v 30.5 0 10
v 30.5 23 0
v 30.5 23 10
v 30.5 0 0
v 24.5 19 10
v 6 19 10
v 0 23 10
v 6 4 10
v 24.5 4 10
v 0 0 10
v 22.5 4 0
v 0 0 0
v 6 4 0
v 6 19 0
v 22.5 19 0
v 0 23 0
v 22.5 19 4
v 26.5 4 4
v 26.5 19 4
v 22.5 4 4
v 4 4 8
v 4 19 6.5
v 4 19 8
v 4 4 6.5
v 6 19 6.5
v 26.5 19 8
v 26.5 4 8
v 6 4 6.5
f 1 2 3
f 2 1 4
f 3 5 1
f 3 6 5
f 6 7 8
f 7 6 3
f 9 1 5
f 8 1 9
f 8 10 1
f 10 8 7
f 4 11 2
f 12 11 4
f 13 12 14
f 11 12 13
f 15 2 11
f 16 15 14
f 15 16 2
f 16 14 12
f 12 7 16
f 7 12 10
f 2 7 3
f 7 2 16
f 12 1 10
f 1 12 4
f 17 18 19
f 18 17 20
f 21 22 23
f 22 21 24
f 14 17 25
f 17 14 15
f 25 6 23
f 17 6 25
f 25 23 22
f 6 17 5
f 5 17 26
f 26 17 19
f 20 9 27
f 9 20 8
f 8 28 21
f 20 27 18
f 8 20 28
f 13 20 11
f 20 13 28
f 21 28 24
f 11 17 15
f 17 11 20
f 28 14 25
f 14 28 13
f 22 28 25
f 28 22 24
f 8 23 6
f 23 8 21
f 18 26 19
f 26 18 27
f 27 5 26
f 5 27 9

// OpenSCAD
jack_length =16.5;
jack_width = 15;

wall_height = 10;
wall_thickness = 4;

catch_overhang = 2;

small_clip_depth = catch_overhang;
big_clip_depth = catch_overhang + 2;
big_clip_clearance = 4;
small_clip_clearance = 6.5;

outer_length = jack_length + small_clip_depth + big_clip_depth +
                            (wall_thickness * 2);
outer_width = jack_width + (wall_thickness * 2);


module clip_catch() {
  rotate([90, 0, 0]) {
    linear_extrude(height = outer_width) {
      polygon(points = [[0,0],
                                       [catch_overhang,0],
                                       [wall_thickness,catch_overhang],
                                       [0,catch_overhang]],
                      paths = [[0,1,2,3]]);
    }
  }
}

module keystone() {
union() {

difference() {
  difference() {
    cube([outer_length, outer_width, wall_height]);
   translate([wall_thickness, wall_thickness, big_clip_clearance]) {
      cube([outer_length, jack_width, wall_height]);
    }
  }
  translate([wall_thickness + small_clip_depth, wall_thickness, 0]){
    cube([jack_length, jack_width, wall_height + 1]);
  }
}

cube([wall_thickness, outer_width, wall_height]);

cube([wall_thickness + small_clip_depth,
           outer_width, small_clip_clearance]);

translate([2, 23, 8]) {
  clip_catch();
}

translate([26.5,0,0]) {
  cube([4, 23, 10]);
}

translate([28.5, 0, 8]) {
  rotate([0, 0, -180]) {
    clip_catch();
  }
}


}
}

keystone();
